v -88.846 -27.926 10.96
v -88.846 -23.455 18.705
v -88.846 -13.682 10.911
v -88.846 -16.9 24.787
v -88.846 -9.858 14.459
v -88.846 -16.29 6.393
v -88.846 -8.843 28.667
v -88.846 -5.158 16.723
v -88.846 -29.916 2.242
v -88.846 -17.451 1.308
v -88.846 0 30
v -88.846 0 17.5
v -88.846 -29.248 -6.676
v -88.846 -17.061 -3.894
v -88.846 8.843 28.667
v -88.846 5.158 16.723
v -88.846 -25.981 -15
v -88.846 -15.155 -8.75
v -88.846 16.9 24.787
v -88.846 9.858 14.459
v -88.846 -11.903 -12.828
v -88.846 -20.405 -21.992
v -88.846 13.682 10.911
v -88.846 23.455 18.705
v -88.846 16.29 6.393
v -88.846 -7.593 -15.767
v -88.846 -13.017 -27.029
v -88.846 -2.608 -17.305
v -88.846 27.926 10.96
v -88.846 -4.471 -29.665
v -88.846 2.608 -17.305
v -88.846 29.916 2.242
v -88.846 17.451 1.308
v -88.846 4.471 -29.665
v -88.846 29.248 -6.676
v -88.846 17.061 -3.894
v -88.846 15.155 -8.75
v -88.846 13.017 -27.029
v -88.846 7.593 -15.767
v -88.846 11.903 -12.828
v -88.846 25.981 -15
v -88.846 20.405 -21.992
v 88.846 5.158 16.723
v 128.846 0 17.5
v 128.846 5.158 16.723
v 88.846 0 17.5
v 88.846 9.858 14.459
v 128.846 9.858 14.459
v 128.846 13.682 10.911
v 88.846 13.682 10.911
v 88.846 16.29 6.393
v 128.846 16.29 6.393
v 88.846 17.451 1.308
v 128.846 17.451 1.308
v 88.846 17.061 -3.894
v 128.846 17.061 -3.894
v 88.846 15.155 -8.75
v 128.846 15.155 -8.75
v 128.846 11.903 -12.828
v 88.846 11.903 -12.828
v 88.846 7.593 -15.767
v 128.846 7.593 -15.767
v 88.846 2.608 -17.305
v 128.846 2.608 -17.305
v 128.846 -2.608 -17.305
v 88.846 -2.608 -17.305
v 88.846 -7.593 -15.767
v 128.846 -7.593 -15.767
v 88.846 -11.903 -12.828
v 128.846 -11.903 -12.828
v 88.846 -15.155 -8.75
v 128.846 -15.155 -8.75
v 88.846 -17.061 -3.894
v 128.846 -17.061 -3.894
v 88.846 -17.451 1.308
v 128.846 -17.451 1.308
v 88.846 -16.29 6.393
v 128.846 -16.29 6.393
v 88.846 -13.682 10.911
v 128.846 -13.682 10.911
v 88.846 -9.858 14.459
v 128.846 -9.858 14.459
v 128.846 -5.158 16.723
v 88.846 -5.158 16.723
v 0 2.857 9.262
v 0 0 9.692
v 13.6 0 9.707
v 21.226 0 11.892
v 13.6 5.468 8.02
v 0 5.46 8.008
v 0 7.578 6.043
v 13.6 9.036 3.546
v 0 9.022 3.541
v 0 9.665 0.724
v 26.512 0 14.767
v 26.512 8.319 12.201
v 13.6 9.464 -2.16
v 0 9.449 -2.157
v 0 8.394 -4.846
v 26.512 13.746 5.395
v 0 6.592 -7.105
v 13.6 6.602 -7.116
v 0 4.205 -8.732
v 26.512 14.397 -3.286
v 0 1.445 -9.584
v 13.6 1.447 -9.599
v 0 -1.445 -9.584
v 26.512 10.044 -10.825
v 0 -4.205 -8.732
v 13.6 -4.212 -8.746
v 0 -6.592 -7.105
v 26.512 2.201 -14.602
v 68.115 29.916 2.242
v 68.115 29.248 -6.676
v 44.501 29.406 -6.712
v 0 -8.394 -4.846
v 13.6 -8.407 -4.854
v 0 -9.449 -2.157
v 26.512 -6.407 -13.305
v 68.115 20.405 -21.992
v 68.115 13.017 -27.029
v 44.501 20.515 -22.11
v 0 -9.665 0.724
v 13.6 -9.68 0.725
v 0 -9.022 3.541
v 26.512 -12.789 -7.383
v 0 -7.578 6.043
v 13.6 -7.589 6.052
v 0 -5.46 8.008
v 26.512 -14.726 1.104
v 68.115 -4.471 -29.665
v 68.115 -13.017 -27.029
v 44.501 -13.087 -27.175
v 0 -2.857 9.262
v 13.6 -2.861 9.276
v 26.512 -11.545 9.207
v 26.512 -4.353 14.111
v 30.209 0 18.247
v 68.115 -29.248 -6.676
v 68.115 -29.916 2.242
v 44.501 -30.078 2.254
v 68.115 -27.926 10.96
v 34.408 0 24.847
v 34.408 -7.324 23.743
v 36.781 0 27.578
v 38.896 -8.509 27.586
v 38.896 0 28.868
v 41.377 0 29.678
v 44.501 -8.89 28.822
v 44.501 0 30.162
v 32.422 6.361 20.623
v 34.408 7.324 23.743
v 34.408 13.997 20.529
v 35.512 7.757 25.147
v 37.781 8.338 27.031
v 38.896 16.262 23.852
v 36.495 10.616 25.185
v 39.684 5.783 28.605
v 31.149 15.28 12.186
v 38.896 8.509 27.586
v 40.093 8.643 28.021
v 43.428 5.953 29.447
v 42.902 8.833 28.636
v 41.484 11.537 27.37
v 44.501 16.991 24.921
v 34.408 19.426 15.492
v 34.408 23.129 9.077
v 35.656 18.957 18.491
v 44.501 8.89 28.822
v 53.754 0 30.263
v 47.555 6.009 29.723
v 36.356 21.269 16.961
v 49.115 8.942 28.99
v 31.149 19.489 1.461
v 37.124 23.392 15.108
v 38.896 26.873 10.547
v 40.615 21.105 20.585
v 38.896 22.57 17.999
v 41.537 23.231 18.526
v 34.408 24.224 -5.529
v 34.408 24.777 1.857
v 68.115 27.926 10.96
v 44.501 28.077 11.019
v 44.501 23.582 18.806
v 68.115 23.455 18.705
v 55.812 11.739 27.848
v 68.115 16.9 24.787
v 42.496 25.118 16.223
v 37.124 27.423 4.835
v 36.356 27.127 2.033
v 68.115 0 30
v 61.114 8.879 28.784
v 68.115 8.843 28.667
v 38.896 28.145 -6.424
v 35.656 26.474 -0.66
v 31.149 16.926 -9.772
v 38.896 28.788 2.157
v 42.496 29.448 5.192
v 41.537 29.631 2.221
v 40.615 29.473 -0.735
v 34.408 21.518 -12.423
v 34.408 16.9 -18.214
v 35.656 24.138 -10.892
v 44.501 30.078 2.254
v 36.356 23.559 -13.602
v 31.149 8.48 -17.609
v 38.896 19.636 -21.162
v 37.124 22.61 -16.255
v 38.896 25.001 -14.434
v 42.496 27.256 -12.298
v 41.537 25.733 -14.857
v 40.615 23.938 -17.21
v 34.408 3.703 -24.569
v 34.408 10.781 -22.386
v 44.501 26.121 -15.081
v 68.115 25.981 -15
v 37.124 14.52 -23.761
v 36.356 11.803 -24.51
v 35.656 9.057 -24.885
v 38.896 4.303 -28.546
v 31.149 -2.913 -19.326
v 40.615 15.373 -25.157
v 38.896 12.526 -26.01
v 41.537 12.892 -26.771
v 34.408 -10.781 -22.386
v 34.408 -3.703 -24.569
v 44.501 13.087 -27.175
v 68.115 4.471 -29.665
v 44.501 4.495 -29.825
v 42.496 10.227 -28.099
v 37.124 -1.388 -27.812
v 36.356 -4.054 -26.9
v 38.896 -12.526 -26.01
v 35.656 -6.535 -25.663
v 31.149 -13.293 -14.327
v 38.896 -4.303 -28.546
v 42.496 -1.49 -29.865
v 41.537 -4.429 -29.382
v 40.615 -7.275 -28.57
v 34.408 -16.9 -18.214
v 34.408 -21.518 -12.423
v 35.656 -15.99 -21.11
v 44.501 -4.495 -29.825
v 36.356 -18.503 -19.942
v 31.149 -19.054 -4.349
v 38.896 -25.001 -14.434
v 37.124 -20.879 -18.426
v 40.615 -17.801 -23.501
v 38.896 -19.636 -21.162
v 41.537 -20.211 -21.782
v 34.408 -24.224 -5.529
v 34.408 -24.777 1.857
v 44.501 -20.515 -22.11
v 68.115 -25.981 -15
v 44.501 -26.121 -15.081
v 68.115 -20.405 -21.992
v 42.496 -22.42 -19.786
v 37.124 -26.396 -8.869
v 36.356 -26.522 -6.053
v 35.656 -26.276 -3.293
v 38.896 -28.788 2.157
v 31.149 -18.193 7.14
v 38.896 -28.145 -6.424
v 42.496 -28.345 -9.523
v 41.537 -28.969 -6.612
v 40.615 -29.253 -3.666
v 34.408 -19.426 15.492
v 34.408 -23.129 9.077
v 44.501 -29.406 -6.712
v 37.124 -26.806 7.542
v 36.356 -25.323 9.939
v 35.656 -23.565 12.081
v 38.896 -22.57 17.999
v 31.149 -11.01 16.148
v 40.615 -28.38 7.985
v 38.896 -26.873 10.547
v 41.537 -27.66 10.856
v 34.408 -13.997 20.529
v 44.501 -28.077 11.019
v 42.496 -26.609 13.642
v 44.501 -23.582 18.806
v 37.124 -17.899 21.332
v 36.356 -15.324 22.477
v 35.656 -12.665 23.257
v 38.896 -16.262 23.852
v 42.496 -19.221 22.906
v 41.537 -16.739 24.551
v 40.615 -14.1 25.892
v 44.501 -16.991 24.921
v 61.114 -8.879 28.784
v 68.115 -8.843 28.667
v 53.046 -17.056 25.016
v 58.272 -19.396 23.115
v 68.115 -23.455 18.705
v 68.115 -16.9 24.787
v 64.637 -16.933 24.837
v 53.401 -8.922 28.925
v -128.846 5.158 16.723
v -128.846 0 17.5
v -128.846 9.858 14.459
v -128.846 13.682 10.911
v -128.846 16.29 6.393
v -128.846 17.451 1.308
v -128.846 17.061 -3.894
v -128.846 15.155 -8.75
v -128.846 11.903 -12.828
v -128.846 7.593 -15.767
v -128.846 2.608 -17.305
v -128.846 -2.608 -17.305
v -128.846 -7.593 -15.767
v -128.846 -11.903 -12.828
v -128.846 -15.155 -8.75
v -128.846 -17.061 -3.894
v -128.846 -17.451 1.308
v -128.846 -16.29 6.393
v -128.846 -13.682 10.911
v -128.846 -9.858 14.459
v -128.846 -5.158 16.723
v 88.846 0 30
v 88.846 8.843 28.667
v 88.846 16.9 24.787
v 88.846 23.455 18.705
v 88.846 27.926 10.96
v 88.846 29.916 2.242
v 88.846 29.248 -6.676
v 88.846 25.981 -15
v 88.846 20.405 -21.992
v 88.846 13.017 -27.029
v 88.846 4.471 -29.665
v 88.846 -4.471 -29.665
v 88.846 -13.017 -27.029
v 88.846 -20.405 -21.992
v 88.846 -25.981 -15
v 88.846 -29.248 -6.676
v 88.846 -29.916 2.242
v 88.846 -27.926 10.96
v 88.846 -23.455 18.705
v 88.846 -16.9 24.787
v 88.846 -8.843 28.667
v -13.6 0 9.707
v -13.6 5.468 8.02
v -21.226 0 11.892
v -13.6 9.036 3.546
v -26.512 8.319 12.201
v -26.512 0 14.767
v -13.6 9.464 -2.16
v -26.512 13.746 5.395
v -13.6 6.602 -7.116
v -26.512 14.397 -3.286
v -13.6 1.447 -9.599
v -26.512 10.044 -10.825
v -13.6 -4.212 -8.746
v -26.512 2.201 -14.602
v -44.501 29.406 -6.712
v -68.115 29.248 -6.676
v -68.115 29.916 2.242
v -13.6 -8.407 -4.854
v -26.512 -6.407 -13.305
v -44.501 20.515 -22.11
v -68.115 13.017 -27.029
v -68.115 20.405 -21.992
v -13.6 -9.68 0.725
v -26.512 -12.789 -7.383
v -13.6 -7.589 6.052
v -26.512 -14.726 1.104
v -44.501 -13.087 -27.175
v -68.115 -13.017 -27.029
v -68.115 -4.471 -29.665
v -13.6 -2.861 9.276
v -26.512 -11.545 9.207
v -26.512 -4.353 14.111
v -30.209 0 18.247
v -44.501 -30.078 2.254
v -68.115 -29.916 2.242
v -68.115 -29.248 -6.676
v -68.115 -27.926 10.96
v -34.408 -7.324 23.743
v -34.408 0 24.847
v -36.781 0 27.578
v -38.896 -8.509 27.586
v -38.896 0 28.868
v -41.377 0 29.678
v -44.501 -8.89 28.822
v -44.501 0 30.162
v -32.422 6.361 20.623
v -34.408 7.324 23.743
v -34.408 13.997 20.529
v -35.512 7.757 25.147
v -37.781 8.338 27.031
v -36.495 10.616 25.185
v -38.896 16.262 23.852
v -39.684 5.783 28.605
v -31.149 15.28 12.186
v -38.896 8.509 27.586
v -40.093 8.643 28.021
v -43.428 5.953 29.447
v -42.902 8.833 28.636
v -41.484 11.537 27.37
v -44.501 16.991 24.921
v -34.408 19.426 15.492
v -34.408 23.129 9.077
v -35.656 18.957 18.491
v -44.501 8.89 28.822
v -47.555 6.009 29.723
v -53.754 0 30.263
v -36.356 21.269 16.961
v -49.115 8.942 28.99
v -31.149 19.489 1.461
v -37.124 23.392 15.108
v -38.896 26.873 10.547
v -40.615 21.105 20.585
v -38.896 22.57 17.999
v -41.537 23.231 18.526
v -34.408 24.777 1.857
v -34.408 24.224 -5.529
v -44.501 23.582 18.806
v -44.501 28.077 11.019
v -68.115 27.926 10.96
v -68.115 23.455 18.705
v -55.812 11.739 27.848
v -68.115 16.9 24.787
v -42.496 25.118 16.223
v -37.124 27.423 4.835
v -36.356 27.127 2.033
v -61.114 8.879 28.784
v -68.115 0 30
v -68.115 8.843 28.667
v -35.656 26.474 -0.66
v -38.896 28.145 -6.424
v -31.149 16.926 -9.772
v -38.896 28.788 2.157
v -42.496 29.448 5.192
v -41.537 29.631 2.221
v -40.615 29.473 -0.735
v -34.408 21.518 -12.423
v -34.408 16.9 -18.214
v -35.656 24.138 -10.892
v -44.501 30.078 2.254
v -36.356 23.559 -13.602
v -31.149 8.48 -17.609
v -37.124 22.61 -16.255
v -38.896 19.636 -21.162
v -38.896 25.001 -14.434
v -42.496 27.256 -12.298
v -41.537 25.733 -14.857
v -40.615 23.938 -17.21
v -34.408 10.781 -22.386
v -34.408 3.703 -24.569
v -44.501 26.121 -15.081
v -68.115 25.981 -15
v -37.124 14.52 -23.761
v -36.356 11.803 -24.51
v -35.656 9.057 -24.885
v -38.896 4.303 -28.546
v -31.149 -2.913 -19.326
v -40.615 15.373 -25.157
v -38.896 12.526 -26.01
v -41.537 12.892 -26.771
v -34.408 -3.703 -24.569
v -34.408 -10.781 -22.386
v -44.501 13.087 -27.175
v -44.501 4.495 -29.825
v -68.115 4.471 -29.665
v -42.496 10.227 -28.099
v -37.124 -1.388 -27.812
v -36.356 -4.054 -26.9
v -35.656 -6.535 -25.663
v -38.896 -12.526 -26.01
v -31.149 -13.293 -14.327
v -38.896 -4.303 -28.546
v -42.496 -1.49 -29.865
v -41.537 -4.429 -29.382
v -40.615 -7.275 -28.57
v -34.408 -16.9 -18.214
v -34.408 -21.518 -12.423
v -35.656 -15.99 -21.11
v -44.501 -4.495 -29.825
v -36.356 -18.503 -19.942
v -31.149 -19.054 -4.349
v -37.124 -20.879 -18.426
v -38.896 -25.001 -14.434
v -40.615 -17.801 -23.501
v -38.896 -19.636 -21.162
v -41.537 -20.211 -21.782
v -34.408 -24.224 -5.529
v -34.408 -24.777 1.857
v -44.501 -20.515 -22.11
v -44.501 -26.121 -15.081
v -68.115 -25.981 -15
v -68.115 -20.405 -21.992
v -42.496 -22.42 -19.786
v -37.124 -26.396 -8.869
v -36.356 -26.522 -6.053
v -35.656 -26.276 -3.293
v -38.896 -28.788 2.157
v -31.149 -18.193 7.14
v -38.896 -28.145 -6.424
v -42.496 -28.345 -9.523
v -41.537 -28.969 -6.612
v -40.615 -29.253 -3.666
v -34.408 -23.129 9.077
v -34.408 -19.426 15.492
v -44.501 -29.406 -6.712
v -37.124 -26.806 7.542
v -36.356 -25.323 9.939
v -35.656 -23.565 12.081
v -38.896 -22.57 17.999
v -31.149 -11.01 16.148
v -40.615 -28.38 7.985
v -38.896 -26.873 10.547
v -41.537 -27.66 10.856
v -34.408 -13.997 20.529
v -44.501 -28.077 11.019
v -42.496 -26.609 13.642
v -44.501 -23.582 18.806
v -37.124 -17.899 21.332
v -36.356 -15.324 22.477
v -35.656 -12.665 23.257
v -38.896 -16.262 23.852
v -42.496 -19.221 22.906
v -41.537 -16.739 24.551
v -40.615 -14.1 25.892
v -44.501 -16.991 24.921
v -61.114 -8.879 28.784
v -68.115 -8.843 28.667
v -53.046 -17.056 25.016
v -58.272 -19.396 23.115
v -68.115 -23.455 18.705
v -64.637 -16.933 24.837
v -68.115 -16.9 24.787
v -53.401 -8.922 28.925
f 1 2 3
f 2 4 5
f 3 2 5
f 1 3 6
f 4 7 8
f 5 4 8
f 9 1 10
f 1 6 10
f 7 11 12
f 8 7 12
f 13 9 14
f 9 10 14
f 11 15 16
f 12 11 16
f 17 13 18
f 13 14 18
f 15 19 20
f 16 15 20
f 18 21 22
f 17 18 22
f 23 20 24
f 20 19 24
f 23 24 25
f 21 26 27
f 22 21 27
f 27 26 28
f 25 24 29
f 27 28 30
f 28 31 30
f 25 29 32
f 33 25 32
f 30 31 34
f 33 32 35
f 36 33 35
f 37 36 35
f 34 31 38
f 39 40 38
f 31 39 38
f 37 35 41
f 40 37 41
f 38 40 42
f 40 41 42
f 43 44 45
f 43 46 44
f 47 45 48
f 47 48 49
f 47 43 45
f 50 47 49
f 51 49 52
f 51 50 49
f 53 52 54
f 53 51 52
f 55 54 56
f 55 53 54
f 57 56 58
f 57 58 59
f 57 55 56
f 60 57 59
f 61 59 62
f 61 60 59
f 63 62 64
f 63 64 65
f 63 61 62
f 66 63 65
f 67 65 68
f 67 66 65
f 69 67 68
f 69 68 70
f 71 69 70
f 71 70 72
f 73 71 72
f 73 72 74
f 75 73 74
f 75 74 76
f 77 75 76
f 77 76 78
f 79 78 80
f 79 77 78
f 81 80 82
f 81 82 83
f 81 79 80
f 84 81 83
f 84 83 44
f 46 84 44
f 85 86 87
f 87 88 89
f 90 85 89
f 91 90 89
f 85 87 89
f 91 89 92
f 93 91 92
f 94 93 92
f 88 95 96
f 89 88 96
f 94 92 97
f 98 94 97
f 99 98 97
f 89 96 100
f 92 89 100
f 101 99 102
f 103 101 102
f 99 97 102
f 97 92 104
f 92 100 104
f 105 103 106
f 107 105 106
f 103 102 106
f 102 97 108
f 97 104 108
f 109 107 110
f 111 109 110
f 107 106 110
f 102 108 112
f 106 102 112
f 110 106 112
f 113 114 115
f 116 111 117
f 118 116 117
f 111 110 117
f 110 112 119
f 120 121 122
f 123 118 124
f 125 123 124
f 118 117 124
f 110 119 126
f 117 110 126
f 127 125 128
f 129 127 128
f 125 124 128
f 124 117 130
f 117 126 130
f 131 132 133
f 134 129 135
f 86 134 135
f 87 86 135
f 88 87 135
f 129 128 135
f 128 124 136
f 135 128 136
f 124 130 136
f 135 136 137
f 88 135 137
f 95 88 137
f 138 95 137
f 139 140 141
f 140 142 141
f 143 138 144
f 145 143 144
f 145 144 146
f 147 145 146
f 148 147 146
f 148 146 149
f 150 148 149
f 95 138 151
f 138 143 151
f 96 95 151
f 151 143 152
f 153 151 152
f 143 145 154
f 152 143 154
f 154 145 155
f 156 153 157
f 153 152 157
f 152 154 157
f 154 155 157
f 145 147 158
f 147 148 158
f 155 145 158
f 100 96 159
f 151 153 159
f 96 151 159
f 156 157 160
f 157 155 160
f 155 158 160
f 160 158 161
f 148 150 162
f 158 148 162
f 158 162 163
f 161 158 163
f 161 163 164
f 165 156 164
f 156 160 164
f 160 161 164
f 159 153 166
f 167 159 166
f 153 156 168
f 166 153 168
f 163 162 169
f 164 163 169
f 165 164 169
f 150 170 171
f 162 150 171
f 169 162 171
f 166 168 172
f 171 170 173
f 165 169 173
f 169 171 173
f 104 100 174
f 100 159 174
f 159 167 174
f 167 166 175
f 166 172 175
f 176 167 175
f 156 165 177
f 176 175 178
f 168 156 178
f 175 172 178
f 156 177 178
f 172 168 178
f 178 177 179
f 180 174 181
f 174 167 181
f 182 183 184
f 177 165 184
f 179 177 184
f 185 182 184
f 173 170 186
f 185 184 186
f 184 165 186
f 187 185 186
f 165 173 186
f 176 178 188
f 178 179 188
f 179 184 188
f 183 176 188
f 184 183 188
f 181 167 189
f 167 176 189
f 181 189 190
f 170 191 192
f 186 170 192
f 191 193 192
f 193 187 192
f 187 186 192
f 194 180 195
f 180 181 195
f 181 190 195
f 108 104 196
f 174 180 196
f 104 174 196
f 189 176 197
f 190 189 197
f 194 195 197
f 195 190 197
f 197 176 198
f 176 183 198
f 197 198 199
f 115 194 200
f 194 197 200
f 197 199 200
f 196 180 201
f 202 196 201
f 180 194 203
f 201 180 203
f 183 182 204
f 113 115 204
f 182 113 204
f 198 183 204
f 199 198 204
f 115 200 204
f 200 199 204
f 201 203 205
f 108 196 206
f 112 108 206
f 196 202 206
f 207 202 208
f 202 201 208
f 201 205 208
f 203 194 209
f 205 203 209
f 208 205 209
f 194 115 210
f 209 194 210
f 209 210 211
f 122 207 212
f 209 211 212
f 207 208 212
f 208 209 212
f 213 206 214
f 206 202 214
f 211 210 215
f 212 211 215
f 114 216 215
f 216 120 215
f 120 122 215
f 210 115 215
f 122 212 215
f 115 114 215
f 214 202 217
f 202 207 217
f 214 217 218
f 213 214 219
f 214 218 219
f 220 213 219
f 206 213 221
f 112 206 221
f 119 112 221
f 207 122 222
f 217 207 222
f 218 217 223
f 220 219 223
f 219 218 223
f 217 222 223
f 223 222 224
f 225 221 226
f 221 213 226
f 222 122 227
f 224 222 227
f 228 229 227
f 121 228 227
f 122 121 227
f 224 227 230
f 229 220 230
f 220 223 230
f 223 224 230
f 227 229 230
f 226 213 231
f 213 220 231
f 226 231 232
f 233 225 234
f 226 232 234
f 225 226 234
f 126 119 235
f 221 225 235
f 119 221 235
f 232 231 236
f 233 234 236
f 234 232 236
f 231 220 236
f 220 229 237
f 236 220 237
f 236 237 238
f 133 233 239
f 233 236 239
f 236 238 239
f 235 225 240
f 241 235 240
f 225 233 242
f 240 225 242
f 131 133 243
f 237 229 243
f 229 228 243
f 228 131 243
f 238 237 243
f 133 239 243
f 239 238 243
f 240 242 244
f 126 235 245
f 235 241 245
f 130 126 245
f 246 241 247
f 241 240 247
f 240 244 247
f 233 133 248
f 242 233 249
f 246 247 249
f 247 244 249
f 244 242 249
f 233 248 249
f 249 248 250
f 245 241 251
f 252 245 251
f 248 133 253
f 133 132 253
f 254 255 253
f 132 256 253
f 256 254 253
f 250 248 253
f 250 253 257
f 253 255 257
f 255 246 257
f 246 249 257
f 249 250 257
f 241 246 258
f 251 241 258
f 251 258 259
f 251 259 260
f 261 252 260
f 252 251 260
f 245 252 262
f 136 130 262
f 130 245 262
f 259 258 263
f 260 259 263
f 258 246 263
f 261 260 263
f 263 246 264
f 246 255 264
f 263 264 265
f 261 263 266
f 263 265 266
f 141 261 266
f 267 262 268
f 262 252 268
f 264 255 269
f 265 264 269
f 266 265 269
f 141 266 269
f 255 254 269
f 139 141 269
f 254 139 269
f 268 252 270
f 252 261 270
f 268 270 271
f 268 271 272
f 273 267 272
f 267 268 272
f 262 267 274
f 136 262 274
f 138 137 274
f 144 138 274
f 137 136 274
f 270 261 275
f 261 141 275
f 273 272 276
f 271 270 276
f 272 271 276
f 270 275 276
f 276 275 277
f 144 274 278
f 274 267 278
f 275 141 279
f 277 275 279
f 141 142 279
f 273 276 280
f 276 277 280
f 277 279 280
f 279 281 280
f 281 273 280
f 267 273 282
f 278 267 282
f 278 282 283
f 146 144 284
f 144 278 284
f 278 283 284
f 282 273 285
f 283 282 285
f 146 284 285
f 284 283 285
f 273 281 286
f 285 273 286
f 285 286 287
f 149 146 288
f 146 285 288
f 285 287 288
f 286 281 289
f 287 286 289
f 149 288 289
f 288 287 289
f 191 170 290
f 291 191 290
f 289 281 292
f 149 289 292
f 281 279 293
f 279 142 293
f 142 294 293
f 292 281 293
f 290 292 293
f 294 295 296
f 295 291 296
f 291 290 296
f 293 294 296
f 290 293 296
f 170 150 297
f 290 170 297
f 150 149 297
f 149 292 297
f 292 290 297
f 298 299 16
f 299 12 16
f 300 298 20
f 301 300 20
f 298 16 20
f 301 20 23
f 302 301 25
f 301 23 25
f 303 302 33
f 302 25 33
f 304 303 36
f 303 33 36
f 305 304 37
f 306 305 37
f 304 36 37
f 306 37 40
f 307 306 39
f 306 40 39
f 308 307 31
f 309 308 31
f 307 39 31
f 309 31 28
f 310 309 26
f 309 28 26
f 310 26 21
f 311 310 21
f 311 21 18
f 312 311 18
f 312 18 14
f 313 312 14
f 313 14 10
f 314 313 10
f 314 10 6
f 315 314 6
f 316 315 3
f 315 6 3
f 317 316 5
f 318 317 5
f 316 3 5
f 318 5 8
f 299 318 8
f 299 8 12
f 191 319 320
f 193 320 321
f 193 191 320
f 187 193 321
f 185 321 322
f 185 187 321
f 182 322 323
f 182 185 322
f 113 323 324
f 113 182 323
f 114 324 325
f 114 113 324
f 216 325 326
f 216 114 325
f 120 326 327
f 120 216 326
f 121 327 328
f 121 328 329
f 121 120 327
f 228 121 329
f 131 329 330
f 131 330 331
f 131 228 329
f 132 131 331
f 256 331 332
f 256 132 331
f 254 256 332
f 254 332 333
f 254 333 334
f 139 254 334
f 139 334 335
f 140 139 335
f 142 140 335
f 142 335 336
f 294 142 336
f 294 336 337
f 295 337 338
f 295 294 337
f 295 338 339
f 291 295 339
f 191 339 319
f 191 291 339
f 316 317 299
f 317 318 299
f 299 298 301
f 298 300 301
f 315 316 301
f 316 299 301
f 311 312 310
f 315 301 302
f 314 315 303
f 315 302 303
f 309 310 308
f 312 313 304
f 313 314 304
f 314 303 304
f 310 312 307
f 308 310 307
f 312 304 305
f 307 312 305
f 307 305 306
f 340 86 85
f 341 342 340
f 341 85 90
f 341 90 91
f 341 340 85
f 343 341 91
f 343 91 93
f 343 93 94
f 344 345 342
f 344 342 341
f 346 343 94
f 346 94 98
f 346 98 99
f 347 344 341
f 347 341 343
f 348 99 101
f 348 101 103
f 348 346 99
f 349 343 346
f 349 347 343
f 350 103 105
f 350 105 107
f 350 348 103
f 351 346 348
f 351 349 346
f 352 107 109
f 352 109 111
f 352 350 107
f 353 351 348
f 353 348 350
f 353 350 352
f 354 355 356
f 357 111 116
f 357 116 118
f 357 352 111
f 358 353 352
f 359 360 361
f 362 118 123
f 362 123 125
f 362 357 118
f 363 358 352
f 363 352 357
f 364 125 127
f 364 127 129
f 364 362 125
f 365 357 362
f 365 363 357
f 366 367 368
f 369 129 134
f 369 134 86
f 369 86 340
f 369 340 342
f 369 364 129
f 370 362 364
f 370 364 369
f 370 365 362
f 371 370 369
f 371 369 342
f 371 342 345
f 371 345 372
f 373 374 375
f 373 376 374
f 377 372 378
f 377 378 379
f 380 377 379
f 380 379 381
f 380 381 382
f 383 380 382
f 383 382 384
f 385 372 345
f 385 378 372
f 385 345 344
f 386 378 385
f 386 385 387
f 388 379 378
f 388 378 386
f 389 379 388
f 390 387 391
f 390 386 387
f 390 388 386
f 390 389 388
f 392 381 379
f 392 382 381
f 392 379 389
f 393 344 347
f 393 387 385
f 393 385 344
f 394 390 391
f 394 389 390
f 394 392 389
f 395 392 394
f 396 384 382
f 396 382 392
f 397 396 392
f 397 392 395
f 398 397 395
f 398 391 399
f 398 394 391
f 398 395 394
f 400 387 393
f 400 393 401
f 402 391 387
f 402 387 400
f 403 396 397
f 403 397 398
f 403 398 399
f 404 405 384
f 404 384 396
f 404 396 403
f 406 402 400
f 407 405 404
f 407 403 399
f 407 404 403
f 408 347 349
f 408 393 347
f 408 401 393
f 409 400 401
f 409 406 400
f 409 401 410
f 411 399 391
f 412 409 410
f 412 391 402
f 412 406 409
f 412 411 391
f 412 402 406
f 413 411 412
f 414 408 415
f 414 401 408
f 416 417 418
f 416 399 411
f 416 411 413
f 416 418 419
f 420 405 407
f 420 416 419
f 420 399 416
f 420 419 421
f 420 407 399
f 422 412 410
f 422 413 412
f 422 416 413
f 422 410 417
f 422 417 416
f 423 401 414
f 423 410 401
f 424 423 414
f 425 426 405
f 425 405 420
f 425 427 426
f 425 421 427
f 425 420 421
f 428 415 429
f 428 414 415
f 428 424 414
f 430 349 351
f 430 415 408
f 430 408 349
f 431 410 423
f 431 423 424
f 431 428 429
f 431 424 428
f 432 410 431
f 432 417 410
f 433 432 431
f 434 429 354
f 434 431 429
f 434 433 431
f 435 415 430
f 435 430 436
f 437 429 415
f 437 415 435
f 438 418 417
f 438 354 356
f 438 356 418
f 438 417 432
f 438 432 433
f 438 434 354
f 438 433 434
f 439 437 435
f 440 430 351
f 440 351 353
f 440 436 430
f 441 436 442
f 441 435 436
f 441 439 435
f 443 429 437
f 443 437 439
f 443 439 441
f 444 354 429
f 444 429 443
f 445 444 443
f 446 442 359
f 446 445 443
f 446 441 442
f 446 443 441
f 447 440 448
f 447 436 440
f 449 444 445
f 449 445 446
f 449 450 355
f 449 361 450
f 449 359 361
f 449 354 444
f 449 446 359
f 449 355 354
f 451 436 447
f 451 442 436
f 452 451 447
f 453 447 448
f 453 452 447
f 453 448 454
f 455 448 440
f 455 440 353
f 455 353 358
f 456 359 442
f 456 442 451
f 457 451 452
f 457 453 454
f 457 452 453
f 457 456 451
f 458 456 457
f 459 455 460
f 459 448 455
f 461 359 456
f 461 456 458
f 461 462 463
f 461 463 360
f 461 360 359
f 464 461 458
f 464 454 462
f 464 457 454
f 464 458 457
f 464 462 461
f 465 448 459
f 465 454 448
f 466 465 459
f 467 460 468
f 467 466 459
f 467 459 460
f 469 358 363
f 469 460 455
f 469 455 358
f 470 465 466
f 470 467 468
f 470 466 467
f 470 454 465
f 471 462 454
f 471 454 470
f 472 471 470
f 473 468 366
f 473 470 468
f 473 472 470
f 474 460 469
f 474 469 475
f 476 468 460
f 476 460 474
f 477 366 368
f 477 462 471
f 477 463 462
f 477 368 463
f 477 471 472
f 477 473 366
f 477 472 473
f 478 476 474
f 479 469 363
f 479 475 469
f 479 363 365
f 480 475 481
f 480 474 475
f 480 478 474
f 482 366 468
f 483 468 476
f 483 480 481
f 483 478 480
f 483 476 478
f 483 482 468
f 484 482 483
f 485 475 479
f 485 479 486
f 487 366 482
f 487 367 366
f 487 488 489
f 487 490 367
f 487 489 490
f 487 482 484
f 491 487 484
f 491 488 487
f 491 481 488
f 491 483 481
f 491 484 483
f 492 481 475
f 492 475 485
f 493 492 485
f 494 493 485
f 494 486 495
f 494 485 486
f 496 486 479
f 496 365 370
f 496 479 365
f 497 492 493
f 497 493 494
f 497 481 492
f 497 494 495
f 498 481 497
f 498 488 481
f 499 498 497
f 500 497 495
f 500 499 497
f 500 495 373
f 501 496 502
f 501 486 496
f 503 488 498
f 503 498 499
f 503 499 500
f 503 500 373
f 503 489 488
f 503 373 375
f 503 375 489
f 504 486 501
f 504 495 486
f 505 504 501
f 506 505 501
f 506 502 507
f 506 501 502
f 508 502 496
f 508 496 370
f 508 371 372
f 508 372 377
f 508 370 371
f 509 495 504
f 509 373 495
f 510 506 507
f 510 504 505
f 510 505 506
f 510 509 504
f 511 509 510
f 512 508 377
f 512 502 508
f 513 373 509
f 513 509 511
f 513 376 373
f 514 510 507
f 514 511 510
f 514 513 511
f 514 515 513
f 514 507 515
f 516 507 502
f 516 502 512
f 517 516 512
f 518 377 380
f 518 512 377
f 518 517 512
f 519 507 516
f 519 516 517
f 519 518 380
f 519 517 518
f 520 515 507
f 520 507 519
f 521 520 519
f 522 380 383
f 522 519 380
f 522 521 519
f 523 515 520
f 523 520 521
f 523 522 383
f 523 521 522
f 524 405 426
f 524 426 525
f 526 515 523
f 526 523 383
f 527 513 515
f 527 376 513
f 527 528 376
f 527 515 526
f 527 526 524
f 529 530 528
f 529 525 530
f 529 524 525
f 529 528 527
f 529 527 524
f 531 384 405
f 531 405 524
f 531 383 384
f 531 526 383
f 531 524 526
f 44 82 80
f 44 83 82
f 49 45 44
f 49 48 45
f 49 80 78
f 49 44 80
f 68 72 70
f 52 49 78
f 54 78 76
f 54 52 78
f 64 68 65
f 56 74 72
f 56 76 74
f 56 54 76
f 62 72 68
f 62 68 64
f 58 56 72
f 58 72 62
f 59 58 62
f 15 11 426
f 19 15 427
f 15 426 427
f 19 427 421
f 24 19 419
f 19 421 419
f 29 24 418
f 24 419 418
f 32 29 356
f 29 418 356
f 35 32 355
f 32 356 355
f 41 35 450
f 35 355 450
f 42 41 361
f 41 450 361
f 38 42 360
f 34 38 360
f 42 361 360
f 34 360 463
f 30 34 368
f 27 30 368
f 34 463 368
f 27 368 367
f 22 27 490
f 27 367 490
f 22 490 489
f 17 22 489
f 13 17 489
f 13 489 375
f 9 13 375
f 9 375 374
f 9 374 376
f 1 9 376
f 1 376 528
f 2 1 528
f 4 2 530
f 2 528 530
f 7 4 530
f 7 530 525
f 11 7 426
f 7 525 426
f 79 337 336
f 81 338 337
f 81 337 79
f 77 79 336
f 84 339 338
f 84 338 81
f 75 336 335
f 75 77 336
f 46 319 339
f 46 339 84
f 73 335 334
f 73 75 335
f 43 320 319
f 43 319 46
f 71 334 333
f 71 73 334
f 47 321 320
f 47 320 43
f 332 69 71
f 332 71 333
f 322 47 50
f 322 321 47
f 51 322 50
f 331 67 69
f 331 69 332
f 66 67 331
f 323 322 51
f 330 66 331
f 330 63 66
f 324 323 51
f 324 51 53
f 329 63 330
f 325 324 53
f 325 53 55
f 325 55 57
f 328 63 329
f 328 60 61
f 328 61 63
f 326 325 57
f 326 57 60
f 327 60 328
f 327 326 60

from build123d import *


with BuildPart() as f1:
    # F0 (on Front) → F1 (revolve)
    with BuildSketch(Plane.XZ):
        with BuildLine():
            Line((0, 9.6923084871), (0, 0))
            Line((0, 0), (128.8461439112, 0))
            Line((128.8461439112, 0), (128.8461439112, 17.5))
            Line((128.8461439112, 17.5), (88.8461439112, 17.5))
            Line((88.8461439112, 17.5), (88.8461439112, 30))
            Line((88.8461439112, 30), (68.1153744155, 30))
            add(Edge.make_bspline(
                [(0, 9.6923084871), (4.2903837959, 9.2833106214), (13.4700518004, 8.4082223307), (31.2065009966, 15.3510841597), (35.2364916061, 30.6873308582), (53.225939561, 30.2545752312), (63.1567054052, 30.0847818821), (68.1153744155, 30)],
                knots=[0, 0, 0, 0, 0.1895589819, 0.4055787556, 0.5938281877, 0.7971886952, 1, 1, 1, 1], degree=3))
        make_face()
    revolve(axis=Axis((64.4230719556, 0, 0), (-1, 0, 0)))

    # F2: F1 across face


with BuildPart() as f1_1:
    add(f1.part)
    add(f1.part.mirror(Plane(origin=(0, 0, 0), x_dir=(0, -1, 0), z_dir=(-1, 0, 0))))


solid = f1_1.part
